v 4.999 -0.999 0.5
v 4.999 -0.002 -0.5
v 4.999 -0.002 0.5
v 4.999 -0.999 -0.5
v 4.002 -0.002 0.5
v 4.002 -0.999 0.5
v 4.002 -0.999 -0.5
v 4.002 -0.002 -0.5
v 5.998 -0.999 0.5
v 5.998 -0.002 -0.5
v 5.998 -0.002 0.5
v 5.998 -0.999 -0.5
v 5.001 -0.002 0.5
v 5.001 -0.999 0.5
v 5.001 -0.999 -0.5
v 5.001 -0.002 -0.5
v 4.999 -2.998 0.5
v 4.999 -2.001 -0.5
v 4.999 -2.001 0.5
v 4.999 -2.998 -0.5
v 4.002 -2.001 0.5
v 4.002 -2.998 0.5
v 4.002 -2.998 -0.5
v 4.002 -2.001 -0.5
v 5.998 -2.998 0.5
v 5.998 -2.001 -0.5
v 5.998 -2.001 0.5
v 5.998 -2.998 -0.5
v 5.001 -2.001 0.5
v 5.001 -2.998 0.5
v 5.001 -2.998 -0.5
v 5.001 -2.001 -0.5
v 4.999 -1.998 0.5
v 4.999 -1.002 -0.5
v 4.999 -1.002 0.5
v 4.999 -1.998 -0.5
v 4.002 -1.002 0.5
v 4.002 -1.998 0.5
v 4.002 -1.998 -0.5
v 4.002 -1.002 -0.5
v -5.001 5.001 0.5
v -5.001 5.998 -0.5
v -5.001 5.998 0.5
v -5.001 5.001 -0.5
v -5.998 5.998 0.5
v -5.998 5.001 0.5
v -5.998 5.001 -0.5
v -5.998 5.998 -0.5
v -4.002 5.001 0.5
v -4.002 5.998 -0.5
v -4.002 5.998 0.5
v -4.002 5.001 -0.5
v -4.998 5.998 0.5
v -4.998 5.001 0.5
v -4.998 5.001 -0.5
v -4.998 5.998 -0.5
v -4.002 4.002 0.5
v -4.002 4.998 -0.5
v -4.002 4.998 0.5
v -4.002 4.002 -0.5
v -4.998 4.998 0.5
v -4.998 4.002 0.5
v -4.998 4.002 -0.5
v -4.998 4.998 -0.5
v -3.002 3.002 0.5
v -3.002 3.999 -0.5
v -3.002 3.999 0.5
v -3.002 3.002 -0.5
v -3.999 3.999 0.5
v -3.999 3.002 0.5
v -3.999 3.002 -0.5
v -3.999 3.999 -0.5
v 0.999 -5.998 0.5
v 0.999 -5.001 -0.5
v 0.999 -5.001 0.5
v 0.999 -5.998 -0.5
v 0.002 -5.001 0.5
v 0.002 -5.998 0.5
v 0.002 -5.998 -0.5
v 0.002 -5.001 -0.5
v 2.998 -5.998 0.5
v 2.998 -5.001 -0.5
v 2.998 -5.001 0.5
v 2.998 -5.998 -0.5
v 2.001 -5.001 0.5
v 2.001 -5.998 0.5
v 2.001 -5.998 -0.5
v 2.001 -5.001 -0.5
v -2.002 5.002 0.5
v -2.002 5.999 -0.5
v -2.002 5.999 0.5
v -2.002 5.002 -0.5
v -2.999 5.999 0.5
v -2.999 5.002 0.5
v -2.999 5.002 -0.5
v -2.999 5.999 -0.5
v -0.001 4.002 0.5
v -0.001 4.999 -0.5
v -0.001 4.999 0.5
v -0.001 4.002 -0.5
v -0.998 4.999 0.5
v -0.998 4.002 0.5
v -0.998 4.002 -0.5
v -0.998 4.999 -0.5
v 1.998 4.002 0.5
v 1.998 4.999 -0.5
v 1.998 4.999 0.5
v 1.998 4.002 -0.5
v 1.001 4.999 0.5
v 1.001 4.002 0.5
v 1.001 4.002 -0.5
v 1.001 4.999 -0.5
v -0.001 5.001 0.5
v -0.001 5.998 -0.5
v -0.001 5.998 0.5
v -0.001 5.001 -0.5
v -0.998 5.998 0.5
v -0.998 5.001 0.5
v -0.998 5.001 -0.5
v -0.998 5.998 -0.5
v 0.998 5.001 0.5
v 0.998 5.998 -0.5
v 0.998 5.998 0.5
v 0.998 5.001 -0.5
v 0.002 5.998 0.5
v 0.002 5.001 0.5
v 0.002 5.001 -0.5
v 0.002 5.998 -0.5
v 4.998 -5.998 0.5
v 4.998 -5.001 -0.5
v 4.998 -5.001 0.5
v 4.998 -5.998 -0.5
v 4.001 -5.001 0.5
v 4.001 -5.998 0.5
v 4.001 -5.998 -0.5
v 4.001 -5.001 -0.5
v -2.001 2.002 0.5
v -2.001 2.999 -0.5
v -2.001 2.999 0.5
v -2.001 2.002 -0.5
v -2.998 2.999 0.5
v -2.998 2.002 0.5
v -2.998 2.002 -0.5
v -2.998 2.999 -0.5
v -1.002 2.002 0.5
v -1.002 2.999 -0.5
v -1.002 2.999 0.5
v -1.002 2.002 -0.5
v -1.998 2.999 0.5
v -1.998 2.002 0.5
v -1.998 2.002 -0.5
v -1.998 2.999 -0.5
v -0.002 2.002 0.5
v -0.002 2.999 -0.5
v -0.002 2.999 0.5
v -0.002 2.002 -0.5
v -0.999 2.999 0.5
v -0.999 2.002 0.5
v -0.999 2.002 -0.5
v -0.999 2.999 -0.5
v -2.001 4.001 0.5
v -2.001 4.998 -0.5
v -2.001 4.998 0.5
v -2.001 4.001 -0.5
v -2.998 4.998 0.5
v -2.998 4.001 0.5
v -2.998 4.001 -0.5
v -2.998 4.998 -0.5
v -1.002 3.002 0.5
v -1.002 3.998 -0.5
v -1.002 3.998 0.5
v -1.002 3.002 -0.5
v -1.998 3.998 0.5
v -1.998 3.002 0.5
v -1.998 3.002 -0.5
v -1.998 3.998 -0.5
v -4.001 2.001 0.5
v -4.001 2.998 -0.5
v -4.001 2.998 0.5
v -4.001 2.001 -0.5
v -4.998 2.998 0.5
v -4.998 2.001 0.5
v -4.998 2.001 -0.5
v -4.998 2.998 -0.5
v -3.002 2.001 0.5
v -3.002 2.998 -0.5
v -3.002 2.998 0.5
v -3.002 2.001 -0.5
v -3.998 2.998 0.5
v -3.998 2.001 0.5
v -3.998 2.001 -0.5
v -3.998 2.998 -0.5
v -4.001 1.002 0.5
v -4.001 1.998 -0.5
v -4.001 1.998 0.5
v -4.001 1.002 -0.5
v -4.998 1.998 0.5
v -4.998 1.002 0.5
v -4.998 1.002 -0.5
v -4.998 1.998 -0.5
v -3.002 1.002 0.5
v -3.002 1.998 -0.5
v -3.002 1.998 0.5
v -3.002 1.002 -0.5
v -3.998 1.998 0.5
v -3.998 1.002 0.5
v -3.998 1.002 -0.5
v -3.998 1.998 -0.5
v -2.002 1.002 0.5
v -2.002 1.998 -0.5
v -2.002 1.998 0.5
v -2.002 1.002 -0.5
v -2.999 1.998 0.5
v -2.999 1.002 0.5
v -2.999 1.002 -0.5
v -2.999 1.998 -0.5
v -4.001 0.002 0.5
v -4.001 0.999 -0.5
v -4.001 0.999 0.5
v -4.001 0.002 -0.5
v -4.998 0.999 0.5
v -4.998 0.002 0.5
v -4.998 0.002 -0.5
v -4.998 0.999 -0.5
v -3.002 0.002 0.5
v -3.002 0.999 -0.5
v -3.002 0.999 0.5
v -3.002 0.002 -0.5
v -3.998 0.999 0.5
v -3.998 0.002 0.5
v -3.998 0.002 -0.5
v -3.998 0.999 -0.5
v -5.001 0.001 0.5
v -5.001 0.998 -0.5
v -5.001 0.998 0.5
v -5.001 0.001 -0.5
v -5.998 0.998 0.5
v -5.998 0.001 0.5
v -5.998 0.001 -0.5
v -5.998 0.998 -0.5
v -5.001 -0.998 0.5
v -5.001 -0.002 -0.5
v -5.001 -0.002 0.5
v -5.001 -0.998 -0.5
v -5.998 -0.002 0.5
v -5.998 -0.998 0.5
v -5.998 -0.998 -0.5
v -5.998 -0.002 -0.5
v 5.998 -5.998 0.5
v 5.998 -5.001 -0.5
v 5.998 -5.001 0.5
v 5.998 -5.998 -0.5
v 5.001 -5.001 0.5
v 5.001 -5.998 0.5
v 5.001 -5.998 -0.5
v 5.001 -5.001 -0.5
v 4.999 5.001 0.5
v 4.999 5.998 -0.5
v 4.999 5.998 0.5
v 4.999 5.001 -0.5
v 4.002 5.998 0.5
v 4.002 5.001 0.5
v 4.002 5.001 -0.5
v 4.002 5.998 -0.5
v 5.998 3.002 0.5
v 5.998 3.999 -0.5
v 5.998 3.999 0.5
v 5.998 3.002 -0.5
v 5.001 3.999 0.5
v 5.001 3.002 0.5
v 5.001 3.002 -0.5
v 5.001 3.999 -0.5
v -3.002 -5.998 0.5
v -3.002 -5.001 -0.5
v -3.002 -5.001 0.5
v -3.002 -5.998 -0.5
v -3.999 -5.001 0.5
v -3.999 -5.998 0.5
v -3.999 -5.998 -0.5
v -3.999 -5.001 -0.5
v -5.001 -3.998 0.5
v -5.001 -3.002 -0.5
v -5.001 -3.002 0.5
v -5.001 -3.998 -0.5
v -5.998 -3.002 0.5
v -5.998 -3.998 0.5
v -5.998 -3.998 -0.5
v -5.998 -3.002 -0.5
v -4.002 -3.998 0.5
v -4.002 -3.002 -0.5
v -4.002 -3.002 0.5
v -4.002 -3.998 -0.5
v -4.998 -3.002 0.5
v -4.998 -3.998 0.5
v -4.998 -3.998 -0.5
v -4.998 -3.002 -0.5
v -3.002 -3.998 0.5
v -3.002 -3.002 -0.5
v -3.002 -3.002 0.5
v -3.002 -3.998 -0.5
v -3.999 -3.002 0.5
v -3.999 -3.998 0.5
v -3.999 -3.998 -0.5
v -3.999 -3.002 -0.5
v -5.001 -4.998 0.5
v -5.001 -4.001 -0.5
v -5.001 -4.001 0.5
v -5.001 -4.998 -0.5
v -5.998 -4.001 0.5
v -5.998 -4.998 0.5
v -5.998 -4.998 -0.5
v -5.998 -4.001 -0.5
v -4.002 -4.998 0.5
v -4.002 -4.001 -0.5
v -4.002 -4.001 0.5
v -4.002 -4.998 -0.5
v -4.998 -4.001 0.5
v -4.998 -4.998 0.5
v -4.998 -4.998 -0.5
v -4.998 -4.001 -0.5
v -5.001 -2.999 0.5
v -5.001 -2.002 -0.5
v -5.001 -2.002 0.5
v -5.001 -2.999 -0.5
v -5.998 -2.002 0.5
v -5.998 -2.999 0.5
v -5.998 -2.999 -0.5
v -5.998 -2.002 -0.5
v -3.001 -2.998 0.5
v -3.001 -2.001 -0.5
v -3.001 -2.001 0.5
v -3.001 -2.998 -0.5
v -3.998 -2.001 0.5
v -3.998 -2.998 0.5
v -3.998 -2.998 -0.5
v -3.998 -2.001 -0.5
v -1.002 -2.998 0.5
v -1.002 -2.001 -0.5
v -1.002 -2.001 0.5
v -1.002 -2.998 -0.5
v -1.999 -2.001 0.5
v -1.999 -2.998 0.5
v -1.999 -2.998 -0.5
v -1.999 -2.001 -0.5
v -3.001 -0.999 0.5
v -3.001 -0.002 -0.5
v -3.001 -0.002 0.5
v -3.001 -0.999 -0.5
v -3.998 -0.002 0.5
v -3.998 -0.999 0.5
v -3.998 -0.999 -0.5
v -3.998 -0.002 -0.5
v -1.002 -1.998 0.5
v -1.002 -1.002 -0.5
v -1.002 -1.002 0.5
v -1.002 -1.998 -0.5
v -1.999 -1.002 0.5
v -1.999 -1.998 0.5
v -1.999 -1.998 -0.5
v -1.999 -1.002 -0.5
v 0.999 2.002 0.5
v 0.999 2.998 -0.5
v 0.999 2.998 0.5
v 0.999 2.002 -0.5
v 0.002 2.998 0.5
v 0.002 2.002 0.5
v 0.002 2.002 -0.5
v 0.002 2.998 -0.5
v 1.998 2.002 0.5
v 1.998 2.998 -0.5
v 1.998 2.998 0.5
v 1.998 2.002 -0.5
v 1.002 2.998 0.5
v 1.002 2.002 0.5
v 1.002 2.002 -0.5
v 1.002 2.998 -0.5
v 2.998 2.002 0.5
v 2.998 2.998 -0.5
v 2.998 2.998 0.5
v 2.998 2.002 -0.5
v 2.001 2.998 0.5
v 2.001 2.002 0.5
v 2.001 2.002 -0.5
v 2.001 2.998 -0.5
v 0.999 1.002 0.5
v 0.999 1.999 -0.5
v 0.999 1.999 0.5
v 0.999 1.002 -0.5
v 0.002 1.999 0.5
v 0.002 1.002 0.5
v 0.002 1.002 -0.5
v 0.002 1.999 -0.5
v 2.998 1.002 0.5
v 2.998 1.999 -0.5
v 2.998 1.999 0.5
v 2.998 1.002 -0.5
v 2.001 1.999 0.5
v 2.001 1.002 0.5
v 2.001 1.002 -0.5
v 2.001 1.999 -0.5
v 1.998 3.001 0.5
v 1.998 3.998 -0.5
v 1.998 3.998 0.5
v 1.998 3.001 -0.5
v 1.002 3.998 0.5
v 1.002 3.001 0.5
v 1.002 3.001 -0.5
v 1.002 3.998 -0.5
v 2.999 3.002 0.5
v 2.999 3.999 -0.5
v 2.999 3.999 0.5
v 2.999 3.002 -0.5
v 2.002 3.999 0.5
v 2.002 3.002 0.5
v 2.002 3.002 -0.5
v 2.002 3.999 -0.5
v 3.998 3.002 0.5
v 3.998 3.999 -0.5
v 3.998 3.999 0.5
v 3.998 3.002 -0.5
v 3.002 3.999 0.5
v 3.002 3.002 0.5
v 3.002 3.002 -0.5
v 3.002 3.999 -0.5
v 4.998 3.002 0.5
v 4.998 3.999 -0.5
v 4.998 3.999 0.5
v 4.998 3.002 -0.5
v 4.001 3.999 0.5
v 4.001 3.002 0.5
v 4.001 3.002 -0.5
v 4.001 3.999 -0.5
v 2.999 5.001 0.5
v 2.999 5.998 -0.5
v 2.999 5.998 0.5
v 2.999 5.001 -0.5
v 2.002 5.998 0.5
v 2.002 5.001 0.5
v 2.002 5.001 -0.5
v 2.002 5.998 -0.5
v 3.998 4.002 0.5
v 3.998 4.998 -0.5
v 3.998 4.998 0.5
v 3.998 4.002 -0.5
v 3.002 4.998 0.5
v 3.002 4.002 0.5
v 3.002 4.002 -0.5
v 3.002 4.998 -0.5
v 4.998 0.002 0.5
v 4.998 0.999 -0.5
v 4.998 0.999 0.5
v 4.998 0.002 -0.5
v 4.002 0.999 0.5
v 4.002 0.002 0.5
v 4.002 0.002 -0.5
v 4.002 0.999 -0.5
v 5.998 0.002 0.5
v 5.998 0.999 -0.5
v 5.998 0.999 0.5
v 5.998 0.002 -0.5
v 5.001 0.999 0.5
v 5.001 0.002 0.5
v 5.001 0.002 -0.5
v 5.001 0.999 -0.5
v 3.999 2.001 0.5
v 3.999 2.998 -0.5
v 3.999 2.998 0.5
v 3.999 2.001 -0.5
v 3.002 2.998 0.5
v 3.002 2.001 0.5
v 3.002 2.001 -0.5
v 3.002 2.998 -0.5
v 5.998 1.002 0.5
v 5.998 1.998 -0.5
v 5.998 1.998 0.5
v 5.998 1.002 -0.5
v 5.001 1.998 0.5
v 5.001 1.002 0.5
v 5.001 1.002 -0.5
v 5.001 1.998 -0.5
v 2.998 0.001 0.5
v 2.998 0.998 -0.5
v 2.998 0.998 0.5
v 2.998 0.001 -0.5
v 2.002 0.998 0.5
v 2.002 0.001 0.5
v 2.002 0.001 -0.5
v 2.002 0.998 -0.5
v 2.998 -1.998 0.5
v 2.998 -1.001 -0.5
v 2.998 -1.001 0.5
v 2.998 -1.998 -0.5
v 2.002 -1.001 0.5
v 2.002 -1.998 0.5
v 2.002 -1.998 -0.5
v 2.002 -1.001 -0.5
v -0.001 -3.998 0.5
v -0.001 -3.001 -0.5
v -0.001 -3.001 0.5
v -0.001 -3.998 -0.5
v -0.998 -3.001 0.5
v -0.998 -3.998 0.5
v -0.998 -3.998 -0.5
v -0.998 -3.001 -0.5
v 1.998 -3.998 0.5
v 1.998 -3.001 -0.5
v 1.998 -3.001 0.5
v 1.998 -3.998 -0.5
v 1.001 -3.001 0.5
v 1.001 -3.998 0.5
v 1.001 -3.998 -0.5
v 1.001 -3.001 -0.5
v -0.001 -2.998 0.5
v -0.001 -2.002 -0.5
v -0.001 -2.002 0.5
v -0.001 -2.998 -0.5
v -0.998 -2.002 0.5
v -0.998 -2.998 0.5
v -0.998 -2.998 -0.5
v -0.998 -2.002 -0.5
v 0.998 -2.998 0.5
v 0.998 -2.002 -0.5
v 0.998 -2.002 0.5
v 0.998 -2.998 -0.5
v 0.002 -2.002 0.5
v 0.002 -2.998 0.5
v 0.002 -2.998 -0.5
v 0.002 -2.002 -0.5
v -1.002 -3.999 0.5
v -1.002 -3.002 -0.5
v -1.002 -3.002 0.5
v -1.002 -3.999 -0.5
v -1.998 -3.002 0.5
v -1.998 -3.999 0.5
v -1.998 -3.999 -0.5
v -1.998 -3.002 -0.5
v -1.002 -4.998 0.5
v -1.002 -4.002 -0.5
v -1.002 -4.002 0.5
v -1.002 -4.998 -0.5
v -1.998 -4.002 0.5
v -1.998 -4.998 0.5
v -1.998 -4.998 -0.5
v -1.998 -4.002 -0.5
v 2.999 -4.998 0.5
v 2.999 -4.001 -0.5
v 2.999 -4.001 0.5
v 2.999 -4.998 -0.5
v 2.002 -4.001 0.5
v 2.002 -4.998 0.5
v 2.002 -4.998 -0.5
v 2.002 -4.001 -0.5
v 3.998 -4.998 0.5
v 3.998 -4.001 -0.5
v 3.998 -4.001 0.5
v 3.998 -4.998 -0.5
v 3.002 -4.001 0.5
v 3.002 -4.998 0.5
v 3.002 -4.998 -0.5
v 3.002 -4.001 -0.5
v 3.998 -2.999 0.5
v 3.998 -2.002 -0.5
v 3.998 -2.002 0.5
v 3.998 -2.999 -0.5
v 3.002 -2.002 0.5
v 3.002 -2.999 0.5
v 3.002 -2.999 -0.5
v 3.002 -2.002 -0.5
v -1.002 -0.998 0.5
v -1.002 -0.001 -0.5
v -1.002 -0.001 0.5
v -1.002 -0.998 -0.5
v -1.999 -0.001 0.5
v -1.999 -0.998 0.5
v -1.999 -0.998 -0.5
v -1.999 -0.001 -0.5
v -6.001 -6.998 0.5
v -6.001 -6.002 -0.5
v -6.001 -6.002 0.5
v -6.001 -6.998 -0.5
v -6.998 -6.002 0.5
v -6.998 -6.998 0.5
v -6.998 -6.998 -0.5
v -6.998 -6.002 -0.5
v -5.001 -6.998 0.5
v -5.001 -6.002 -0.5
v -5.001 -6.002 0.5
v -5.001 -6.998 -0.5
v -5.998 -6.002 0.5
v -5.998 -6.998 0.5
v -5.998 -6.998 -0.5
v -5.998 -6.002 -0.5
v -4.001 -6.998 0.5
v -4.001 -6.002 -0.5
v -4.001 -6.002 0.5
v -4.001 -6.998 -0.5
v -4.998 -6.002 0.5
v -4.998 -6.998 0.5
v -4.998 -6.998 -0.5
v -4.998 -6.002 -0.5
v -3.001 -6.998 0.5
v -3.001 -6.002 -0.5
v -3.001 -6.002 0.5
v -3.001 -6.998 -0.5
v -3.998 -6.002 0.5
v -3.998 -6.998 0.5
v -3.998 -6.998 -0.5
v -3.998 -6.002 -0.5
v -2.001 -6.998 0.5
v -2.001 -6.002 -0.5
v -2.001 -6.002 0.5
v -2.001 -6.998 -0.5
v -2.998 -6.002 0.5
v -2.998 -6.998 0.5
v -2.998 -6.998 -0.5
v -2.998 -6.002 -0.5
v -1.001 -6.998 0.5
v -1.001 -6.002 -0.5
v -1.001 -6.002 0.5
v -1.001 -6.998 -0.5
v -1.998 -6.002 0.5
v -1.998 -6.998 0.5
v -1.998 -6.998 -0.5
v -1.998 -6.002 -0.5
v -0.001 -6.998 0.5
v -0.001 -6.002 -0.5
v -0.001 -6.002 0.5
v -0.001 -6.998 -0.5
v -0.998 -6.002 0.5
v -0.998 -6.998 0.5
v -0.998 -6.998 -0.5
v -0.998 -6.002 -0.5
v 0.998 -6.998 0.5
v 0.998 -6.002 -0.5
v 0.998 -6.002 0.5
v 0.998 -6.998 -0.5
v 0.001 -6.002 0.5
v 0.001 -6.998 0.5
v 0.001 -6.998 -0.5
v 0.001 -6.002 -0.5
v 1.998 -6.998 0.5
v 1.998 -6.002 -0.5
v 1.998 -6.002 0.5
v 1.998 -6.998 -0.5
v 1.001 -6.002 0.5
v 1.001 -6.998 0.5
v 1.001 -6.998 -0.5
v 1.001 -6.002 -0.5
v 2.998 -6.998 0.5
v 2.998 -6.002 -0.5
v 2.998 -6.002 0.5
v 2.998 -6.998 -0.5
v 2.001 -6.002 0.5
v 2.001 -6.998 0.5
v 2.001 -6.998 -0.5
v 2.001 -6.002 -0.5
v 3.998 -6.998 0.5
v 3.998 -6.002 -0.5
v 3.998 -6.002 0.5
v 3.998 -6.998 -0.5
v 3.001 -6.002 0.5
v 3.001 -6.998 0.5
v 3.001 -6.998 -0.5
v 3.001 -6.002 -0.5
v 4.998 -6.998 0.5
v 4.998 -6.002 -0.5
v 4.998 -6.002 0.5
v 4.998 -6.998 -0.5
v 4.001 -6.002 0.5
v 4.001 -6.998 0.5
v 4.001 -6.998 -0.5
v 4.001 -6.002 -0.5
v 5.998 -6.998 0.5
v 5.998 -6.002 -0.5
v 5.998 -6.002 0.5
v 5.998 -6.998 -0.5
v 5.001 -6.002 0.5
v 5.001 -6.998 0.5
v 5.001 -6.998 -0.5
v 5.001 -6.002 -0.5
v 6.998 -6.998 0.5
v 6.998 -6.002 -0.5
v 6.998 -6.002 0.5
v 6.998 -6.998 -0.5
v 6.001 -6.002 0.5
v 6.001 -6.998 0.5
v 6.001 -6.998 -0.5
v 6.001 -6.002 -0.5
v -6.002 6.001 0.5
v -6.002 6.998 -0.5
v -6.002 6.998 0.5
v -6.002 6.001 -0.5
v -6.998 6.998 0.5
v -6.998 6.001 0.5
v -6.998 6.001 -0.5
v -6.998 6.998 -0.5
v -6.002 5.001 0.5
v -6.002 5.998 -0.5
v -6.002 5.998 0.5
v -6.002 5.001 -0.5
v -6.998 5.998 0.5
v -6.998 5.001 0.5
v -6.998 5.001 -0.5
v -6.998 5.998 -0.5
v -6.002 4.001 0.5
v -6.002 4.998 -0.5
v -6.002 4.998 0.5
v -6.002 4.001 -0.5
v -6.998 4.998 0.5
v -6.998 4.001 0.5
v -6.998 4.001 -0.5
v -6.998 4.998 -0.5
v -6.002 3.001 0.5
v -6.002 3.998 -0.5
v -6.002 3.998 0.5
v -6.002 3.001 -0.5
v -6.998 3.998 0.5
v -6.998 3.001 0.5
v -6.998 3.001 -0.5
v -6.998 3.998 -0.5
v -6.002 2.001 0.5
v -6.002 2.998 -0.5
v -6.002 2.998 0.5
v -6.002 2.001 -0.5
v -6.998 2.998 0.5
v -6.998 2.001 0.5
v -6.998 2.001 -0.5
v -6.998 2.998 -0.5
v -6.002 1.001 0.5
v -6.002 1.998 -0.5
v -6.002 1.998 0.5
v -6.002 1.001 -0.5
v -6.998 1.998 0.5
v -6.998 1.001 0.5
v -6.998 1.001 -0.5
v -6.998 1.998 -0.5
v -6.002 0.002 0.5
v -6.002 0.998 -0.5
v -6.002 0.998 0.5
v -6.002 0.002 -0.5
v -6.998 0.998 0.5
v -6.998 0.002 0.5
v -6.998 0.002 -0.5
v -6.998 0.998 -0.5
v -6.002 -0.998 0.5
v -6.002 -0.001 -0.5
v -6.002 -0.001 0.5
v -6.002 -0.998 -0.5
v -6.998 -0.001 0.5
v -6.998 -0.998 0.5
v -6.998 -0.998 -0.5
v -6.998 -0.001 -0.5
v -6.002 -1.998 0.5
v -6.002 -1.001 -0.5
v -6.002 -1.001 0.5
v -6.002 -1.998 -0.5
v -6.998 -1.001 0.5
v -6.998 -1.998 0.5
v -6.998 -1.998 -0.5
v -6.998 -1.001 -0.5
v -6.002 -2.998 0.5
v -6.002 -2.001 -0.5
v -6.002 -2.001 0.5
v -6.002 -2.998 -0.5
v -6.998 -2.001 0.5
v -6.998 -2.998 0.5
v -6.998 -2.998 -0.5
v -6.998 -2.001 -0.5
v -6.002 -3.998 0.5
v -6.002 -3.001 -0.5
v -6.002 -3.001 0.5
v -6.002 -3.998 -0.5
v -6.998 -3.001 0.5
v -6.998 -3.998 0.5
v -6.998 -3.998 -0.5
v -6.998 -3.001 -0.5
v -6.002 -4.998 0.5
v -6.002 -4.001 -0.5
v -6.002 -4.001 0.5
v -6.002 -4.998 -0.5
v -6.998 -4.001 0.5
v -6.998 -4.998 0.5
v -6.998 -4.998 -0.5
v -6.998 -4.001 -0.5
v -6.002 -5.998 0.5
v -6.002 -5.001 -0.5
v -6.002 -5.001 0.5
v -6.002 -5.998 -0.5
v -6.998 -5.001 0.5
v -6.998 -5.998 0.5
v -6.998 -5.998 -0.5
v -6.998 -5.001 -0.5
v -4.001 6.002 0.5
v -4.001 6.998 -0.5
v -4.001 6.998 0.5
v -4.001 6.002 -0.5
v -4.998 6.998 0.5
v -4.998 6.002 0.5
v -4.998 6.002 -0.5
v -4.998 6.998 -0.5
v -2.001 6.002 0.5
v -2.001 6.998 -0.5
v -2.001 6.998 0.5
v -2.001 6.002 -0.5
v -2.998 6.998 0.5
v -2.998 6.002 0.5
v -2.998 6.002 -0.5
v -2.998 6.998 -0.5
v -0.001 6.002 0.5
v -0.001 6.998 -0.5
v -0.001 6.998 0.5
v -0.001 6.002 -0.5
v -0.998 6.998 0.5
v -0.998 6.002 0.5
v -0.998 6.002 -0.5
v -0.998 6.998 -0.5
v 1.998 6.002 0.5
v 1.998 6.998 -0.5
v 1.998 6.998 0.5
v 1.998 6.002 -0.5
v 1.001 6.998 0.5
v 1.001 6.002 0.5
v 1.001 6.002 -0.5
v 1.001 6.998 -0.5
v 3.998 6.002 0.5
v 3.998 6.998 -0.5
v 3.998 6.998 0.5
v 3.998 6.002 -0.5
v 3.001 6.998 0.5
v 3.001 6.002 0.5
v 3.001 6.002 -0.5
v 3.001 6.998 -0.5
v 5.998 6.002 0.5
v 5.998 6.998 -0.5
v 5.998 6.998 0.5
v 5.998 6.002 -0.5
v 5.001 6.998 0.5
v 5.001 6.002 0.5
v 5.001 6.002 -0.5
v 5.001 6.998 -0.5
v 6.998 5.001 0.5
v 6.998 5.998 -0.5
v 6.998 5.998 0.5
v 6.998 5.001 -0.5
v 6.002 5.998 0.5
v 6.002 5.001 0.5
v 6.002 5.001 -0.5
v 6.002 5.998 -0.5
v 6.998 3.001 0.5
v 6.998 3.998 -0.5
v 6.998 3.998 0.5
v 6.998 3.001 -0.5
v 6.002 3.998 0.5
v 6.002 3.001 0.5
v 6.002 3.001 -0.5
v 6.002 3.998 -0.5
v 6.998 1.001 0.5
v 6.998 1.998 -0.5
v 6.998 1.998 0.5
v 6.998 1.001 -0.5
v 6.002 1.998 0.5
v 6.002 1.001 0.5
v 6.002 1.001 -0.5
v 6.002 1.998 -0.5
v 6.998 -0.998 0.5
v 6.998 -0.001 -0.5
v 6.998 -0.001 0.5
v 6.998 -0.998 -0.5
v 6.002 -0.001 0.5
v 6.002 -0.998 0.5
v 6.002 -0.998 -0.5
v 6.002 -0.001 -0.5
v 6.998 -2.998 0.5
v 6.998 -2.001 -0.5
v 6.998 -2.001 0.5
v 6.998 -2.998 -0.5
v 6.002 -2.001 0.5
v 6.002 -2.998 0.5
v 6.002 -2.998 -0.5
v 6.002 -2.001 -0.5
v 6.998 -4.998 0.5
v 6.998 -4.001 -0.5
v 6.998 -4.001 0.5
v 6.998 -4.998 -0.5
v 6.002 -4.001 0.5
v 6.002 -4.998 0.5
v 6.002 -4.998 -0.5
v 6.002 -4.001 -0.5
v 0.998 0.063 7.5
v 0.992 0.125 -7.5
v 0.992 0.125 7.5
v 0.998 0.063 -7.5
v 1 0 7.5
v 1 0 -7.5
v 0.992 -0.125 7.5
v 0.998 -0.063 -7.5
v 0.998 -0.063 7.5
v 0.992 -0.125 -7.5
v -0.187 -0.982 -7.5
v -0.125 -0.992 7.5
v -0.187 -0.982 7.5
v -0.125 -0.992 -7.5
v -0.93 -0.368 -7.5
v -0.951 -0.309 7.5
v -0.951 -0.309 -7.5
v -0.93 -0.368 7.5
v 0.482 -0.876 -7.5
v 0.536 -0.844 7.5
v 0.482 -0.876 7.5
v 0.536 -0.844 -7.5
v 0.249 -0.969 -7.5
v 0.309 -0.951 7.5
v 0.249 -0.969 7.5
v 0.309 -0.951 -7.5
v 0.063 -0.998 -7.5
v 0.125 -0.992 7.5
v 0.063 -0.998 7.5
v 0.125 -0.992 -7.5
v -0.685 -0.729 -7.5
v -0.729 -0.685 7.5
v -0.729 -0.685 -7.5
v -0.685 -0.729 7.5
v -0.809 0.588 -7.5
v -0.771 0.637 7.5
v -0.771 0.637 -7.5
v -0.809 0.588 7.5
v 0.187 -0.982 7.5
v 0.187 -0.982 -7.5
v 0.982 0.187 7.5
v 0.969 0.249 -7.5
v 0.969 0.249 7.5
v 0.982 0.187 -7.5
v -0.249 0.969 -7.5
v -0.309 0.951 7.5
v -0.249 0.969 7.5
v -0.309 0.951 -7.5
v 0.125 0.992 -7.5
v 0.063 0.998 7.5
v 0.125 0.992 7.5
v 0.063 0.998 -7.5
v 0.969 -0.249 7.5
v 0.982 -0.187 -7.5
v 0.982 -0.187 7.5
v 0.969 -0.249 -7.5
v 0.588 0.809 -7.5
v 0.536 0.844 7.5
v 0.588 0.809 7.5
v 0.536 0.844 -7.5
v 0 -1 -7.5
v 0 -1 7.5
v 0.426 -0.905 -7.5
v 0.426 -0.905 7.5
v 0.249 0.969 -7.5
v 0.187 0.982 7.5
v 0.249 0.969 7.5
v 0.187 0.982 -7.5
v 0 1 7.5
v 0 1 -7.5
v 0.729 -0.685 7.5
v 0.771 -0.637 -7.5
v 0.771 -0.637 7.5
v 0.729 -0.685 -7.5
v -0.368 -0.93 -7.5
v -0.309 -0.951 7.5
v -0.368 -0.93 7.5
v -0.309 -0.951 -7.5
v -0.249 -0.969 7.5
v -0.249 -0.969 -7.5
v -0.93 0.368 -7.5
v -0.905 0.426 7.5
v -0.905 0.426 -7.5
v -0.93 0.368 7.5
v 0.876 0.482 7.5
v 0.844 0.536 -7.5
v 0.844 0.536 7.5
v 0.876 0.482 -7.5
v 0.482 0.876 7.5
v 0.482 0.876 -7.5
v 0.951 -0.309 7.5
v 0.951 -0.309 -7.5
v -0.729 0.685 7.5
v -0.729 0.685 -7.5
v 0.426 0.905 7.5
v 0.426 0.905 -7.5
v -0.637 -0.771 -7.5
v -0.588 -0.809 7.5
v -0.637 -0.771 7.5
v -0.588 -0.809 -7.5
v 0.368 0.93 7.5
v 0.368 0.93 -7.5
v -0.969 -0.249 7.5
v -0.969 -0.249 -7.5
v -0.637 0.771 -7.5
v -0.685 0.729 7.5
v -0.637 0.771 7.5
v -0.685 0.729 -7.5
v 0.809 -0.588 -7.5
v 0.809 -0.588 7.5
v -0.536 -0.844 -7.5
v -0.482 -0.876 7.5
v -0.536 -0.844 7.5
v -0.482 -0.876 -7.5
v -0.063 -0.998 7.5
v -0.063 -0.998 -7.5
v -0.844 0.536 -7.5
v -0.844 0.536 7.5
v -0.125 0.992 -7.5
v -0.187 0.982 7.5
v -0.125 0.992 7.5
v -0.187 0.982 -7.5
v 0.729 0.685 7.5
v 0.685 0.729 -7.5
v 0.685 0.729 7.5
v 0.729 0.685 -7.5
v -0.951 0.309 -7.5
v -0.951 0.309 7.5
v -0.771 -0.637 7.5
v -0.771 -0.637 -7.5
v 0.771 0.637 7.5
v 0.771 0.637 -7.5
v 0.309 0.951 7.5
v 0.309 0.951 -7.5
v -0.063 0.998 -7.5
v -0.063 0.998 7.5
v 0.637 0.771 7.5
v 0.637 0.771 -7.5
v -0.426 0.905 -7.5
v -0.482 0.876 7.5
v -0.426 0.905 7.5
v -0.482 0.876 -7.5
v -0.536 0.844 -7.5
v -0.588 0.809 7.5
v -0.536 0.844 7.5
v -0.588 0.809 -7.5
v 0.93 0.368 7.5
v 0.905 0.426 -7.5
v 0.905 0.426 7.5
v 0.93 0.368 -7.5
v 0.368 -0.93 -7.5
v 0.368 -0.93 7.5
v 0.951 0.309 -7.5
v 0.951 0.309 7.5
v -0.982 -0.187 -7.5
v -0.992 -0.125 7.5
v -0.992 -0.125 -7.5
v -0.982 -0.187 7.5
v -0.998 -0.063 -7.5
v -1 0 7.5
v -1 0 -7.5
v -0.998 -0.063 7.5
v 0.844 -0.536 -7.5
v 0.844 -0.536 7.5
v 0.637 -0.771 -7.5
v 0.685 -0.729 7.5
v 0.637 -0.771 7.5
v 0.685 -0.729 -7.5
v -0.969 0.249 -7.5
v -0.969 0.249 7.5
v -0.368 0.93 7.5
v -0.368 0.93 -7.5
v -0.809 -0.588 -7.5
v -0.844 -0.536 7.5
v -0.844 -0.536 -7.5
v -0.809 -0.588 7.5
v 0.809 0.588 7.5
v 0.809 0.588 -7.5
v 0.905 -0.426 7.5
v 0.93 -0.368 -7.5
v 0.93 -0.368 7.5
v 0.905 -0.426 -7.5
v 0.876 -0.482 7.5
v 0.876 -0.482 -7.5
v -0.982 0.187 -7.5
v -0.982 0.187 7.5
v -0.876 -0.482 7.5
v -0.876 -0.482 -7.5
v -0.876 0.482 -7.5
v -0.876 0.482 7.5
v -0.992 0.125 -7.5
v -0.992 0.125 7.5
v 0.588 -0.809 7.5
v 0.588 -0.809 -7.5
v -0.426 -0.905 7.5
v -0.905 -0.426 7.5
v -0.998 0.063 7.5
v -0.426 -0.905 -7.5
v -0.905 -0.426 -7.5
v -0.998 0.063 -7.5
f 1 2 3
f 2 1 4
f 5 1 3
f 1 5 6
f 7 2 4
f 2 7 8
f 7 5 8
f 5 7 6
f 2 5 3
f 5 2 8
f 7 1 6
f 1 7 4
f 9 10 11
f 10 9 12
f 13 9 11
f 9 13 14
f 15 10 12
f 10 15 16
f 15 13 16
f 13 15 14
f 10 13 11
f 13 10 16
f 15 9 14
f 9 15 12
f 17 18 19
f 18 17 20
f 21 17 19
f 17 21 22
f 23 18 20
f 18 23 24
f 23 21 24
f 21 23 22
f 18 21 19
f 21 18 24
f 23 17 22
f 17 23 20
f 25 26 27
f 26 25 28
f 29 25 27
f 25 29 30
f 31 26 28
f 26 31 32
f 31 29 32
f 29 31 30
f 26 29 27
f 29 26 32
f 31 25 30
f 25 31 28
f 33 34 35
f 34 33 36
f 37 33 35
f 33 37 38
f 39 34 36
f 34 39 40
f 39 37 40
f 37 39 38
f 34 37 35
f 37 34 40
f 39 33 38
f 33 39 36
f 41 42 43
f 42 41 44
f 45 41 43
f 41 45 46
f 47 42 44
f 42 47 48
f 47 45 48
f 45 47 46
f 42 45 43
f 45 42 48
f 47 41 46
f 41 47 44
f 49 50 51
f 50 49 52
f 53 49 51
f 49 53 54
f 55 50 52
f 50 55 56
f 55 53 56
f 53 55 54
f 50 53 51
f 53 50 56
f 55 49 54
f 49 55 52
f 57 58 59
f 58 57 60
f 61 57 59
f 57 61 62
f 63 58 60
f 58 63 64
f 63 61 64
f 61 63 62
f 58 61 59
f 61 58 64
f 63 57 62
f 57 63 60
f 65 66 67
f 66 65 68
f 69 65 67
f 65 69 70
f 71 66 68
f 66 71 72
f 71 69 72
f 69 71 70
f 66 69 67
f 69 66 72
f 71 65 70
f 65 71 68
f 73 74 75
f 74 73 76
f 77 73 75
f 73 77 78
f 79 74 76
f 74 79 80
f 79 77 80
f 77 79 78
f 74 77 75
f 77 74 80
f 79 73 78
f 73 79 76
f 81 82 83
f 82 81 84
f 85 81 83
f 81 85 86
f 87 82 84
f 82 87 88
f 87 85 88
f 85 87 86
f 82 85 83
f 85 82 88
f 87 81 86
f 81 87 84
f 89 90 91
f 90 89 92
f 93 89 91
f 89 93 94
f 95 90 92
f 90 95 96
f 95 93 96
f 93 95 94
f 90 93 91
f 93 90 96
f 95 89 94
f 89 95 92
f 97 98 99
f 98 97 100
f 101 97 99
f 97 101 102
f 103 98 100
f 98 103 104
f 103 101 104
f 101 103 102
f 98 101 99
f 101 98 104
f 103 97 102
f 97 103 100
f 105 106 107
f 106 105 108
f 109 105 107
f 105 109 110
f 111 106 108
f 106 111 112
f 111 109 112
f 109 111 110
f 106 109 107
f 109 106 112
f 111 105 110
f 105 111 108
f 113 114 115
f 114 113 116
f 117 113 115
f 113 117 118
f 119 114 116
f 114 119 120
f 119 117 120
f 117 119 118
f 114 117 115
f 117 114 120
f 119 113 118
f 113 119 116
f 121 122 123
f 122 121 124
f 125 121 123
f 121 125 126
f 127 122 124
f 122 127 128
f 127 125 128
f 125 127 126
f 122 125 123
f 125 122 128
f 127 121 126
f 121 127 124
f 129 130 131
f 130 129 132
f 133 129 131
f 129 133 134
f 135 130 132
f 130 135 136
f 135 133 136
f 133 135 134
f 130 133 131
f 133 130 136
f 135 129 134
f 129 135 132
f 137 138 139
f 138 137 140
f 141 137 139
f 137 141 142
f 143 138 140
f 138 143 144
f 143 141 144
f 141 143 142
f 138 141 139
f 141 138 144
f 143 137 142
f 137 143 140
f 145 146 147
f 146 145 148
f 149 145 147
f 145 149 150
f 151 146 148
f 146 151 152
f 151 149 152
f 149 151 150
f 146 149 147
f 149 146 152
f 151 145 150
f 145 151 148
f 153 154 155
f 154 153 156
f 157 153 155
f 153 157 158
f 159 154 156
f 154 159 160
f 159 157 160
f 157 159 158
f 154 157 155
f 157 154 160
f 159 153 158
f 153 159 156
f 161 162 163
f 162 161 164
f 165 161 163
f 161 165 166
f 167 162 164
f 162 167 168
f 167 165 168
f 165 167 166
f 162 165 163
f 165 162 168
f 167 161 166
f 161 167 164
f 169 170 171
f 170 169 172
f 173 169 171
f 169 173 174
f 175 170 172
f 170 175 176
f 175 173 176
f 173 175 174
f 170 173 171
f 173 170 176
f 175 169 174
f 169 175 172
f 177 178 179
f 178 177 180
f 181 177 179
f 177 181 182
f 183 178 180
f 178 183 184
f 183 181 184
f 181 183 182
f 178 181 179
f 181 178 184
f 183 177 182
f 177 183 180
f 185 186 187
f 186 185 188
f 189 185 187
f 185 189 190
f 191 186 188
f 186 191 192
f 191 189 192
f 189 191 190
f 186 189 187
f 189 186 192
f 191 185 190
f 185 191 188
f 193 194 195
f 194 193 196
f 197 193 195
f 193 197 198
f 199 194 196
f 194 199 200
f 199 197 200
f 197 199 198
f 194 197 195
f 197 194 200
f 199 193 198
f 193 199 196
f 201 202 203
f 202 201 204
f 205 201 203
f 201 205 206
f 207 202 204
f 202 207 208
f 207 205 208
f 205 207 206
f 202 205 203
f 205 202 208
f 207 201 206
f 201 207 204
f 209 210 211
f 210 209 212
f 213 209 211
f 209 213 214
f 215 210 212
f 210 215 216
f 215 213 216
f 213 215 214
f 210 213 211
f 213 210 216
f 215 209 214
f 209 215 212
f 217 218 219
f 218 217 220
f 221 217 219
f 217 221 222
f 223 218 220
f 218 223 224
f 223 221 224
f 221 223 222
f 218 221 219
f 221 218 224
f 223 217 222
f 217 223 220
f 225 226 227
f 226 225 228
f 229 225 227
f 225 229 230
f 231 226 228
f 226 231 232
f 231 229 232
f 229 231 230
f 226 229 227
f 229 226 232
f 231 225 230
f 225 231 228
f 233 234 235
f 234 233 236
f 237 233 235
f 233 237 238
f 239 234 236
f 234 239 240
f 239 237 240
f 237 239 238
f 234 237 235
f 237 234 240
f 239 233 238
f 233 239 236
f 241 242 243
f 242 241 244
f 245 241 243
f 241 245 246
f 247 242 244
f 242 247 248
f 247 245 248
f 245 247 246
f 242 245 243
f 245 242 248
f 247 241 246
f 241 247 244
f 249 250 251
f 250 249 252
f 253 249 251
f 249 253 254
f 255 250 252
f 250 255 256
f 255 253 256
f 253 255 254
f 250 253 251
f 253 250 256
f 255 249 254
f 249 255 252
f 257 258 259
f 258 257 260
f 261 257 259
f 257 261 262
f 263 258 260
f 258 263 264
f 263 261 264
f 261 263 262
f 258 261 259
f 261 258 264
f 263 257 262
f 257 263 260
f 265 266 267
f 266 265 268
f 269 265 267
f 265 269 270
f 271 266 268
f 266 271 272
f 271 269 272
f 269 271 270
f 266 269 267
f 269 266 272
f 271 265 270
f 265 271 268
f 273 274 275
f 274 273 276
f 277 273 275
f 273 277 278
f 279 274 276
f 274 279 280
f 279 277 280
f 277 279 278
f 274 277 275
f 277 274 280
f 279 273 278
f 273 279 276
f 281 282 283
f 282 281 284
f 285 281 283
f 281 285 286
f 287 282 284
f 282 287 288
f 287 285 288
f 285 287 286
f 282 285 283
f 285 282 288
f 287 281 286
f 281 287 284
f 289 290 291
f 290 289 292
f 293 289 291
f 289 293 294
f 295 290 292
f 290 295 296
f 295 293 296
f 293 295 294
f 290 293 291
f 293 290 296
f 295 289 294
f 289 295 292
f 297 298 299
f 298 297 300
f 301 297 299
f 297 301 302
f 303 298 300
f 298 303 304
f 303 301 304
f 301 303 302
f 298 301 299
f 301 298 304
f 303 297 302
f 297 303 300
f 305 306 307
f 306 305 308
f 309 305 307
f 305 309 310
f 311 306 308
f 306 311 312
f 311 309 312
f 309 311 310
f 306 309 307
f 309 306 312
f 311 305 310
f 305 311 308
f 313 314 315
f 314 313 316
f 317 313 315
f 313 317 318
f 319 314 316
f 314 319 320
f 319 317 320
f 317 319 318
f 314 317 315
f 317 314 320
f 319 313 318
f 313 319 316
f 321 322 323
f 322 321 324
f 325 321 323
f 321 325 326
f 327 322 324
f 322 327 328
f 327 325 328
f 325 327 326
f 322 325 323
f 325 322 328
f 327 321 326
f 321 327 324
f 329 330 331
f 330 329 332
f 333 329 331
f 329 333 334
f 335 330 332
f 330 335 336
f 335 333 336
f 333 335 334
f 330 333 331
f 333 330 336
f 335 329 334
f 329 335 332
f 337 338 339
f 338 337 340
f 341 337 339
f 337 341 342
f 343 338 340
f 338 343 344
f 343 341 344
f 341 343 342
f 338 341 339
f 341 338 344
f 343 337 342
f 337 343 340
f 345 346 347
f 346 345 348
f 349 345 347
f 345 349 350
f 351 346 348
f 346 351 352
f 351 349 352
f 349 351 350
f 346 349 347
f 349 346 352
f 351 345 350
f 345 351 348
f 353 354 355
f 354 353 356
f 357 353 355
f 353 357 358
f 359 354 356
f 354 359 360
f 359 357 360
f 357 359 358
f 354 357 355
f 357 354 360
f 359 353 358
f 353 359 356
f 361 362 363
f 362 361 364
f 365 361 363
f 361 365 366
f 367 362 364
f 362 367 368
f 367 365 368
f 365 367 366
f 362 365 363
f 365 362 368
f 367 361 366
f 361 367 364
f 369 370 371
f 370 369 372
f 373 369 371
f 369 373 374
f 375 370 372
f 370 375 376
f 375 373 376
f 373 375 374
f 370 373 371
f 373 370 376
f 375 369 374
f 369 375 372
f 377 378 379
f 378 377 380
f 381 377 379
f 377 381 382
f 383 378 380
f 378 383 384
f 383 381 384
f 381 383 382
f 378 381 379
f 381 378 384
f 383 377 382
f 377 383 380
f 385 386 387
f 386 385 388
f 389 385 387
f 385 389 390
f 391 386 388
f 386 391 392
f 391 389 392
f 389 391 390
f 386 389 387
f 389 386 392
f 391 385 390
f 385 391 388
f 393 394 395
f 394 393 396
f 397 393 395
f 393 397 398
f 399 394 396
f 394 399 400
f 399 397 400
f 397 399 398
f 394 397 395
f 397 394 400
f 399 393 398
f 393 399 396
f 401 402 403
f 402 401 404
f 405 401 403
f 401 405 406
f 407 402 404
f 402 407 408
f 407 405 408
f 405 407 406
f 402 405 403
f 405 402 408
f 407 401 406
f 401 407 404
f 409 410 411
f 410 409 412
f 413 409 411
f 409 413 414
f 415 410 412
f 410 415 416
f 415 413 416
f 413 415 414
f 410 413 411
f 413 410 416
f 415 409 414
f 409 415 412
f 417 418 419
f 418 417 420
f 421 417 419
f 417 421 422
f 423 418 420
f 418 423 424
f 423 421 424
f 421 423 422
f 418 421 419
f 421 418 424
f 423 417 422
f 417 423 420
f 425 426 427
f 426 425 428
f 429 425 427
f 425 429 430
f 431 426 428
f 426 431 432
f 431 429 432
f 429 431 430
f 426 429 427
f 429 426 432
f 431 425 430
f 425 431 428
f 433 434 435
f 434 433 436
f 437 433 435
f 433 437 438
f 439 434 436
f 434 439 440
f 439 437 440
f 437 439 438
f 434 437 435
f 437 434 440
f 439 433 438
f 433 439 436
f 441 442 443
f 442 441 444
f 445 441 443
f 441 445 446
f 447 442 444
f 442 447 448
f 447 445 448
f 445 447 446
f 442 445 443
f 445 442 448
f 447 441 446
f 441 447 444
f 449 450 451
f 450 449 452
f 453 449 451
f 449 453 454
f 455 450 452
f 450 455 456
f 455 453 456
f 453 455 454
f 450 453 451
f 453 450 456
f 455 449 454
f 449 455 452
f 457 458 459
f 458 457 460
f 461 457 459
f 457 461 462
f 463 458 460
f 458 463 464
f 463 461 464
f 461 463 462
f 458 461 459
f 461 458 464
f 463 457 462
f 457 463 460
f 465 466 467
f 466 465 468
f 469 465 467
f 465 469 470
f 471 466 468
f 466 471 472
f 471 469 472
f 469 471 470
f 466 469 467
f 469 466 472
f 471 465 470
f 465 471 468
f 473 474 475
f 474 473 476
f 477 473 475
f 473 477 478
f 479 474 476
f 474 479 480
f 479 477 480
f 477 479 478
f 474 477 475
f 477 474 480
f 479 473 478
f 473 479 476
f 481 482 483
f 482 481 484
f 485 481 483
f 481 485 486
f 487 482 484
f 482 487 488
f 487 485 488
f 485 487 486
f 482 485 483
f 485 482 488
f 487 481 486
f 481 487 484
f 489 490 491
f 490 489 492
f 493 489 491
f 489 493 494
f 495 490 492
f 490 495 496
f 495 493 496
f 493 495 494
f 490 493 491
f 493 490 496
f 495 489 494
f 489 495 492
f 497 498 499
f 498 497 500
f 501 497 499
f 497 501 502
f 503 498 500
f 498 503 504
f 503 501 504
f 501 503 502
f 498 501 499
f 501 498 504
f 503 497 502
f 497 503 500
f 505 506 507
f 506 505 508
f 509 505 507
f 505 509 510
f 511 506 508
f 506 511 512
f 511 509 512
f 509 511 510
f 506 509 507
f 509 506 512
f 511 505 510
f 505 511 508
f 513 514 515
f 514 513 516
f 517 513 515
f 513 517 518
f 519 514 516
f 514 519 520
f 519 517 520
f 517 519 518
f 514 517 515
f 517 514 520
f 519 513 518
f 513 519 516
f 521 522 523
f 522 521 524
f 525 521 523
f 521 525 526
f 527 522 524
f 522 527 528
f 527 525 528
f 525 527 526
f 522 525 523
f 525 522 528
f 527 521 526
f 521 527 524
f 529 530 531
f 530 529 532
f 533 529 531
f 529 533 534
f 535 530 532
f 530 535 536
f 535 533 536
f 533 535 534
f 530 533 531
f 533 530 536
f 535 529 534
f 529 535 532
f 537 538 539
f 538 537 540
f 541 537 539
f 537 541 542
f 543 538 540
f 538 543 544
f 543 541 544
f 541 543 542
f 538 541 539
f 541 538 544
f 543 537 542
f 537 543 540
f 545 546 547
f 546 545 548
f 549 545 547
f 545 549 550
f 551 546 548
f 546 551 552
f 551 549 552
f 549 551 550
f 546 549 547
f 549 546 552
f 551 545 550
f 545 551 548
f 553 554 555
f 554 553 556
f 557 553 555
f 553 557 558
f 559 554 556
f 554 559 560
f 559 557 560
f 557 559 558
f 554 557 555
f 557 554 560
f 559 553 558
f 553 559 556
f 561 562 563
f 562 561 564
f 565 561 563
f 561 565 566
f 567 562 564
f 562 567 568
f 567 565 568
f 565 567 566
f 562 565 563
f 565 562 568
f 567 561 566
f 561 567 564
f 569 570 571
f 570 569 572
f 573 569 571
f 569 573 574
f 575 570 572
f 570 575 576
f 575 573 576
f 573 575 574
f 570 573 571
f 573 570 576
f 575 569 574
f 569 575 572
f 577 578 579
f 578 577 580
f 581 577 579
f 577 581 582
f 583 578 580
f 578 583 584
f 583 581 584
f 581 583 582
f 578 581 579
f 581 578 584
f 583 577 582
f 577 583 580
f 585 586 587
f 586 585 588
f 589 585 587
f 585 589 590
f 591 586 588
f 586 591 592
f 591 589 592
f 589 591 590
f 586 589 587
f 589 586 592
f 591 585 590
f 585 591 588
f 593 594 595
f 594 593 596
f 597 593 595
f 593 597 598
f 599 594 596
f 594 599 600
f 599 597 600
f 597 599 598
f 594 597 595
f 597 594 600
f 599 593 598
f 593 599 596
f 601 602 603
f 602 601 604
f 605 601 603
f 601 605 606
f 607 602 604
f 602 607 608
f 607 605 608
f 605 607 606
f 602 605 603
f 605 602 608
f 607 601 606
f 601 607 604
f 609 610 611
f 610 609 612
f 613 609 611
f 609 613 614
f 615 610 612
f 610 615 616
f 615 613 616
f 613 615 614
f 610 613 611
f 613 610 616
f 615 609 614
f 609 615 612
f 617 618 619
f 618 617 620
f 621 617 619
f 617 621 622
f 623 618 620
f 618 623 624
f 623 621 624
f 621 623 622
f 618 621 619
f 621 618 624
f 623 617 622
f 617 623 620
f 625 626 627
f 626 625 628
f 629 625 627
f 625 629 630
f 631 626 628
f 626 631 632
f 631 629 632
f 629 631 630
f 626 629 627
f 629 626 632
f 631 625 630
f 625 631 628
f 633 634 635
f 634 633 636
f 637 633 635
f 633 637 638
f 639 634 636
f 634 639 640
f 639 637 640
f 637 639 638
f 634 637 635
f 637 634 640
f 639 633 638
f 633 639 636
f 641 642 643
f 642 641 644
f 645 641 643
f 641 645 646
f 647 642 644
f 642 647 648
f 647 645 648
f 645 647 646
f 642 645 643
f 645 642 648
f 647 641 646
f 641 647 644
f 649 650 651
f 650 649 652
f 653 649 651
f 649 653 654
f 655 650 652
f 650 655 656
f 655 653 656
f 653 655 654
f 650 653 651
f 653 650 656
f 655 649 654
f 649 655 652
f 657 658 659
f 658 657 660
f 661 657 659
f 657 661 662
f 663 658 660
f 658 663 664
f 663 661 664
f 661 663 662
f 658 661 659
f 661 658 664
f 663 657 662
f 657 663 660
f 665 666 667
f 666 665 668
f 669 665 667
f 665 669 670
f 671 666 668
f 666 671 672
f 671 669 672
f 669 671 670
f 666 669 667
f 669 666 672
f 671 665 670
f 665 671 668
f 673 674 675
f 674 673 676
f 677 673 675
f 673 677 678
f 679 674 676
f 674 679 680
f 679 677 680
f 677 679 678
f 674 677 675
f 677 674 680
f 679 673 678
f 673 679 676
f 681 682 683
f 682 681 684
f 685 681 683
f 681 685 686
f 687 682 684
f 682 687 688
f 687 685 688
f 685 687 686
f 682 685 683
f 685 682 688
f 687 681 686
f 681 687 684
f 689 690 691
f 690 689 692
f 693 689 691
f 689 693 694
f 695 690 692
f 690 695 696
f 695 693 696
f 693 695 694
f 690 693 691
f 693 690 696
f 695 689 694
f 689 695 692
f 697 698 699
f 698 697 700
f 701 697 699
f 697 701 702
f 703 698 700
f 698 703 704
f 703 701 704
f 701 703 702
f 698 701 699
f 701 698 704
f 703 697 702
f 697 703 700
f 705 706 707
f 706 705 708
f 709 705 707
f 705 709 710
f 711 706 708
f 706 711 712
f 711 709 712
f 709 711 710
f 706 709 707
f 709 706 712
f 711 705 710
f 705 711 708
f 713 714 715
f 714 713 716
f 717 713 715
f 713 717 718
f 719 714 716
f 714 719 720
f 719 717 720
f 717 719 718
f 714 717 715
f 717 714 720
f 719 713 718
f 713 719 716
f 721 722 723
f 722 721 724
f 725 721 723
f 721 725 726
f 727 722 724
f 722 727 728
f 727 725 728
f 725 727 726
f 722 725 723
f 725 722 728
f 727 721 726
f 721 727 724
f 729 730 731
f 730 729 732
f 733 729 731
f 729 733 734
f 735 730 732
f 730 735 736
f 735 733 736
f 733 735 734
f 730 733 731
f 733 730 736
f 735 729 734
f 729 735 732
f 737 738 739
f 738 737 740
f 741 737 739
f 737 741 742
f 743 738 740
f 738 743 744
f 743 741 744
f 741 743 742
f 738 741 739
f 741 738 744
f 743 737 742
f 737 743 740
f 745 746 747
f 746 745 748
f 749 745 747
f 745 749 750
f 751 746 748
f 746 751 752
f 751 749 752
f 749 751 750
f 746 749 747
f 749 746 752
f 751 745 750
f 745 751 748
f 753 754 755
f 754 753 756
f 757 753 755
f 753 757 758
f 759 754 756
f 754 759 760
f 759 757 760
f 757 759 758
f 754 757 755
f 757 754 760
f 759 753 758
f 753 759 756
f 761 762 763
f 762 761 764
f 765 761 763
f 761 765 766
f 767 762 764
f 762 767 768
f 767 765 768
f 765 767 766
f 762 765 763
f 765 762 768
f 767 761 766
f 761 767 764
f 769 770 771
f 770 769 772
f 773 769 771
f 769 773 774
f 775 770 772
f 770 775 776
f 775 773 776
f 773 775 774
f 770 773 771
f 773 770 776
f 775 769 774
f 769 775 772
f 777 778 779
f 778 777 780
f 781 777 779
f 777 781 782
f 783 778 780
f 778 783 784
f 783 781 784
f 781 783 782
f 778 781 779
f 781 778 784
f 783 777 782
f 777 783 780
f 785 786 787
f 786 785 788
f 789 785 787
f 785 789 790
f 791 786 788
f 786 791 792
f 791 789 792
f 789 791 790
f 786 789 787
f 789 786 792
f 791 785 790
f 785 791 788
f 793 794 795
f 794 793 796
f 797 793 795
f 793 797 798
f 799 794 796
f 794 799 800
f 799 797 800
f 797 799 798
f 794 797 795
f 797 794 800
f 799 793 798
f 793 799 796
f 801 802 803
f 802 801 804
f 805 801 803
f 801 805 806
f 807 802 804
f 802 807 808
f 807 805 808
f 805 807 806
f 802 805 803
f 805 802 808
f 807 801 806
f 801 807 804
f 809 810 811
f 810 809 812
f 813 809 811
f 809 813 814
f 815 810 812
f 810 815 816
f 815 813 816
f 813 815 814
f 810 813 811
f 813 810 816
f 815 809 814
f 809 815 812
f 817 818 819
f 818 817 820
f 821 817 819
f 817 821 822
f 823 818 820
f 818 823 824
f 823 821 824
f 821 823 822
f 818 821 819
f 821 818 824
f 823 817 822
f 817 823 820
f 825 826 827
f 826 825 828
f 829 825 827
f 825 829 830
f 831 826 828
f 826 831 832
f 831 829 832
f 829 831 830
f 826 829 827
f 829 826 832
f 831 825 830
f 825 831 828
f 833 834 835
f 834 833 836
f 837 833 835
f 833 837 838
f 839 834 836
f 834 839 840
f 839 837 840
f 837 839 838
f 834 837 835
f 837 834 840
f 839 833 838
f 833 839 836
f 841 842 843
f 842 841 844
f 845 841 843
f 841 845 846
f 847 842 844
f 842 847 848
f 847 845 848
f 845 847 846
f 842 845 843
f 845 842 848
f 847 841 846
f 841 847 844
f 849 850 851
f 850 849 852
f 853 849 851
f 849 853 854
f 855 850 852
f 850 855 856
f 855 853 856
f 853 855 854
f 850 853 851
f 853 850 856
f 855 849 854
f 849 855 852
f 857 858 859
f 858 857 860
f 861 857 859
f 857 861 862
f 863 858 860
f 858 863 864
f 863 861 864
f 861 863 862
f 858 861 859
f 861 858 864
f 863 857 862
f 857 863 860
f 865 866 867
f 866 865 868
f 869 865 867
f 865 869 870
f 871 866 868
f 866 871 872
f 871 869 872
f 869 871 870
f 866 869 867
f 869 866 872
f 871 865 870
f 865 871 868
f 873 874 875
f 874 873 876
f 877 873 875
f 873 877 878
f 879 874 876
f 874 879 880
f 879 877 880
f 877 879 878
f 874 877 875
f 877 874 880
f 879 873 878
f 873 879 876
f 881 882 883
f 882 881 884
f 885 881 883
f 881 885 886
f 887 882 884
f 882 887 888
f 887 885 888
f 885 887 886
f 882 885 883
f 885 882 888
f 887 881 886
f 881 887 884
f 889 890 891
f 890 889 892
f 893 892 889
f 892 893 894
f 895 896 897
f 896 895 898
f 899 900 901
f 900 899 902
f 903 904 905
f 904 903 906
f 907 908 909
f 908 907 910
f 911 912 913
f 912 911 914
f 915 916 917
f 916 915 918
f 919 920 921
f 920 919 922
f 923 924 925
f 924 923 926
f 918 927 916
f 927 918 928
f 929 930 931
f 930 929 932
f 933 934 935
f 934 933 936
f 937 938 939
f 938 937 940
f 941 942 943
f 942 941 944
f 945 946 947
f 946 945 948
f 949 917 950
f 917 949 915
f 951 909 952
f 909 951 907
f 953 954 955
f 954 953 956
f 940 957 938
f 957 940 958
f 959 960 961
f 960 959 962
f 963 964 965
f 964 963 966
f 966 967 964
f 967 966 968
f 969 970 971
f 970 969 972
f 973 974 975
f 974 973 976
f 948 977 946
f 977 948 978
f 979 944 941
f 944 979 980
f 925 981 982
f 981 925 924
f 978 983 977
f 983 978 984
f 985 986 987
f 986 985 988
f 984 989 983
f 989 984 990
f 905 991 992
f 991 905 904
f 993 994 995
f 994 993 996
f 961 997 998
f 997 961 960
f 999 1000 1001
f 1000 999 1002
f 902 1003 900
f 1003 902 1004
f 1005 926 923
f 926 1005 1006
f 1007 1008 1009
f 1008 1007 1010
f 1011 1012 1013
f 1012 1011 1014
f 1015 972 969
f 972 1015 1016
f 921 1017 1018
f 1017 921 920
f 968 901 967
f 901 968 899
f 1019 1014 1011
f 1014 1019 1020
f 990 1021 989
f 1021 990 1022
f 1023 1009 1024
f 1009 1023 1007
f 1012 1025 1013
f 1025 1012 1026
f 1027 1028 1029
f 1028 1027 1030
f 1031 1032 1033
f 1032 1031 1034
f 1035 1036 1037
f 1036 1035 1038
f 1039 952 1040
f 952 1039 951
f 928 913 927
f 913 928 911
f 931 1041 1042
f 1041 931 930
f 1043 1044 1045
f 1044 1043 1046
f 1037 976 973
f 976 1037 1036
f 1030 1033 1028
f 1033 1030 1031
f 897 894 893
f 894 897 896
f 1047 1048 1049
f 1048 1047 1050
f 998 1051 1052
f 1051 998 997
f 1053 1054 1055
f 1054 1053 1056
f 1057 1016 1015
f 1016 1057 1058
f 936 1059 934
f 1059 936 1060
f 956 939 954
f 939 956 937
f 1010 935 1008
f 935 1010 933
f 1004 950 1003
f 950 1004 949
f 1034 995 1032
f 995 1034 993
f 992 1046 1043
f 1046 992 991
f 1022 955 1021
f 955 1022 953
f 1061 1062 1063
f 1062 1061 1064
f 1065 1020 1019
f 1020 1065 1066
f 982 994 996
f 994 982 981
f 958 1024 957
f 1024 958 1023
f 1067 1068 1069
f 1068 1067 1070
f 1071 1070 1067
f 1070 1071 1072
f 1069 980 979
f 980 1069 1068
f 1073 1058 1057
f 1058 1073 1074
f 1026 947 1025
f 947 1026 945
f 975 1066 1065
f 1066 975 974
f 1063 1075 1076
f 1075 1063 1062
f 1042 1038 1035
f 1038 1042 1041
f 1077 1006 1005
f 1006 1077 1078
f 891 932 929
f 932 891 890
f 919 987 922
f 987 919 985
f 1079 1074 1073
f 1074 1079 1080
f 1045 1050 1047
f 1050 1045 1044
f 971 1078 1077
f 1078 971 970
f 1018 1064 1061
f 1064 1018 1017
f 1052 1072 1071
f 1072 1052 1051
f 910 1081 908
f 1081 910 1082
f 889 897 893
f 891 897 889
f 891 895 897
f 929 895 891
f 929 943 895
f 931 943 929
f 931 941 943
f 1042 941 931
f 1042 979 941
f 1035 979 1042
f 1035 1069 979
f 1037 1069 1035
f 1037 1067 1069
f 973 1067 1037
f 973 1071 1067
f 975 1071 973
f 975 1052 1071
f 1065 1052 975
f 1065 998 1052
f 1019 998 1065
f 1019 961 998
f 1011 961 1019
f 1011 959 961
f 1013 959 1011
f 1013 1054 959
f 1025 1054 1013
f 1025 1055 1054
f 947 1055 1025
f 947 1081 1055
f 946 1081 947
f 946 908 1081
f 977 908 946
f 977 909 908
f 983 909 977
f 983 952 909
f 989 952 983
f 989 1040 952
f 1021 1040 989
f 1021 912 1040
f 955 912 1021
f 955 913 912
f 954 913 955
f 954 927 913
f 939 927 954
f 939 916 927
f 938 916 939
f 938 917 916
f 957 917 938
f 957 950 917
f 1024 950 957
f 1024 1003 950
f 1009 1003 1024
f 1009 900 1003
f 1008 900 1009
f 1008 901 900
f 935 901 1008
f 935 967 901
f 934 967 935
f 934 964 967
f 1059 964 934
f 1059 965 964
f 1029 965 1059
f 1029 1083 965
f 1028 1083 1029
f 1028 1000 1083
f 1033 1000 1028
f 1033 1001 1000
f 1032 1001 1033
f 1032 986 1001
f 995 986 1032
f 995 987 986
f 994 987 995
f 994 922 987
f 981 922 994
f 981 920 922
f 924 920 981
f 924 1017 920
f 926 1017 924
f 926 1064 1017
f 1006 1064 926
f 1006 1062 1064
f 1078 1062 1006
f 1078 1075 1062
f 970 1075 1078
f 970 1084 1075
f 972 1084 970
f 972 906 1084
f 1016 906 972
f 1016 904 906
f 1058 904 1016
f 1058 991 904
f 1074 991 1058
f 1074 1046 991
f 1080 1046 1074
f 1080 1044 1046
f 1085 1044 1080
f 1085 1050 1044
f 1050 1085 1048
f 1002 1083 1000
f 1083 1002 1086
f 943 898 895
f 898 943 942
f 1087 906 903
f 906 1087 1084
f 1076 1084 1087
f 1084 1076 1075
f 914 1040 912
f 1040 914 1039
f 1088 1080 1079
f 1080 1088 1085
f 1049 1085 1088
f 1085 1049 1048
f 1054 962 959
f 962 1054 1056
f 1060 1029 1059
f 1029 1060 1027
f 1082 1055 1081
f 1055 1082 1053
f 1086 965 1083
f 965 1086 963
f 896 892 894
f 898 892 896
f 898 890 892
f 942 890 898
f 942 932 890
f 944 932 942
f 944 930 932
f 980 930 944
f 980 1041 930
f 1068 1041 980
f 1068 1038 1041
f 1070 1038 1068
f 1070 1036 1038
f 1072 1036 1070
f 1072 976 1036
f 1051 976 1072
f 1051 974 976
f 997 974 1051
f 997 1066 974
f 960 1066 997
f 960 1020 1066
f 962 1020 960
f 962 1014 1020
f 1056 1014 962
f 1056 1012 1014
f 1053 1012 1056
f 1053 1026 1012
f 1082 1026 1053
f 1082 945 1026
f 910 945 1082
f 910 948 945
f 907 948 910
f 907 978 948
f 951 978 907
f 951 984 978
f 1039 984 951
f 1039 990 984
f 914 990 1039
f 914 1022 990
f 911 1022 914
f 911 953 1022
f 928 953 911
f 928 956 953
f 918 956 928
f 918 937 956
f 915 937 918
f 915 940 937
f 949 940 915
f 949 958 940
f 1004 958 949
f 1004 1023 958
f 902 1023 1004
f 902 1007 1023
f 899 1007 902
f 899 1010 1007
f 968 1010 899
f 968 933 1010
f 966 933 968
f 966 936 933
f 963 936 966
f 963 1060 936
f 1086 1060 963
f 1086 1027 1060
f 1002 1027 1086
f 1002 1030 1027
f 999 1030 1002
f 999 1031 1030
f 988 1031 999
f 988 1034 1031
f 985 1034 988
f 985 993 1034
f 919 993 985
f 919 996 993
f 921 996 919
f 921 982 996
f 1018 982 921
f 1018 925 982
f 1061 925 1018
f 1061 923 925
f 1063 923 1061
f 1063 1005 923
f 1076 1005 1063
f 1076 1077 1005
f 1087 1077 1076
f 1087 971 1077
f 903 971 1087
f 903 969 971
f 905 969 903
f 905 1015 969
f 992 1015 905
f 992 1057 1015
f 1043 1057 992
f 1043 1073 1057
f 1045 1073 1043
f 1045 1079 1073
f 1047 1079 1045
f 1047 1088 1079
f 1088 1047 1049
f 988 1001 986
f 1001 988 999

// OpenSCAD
/* Unit Test 15: same as test case 04, center=true */
use <../datamatrix.scad>
data_matrix(
	concat(
		c40_mode(),
		dm_c40("TELESI"),
		ascii_mode(),
		dm_ascii("S1")
	),
	mark="black", center=true);

/* indicate where the origin is since the images don't show the axes */
cylinder(15, 1, center=true, $fn=100);
